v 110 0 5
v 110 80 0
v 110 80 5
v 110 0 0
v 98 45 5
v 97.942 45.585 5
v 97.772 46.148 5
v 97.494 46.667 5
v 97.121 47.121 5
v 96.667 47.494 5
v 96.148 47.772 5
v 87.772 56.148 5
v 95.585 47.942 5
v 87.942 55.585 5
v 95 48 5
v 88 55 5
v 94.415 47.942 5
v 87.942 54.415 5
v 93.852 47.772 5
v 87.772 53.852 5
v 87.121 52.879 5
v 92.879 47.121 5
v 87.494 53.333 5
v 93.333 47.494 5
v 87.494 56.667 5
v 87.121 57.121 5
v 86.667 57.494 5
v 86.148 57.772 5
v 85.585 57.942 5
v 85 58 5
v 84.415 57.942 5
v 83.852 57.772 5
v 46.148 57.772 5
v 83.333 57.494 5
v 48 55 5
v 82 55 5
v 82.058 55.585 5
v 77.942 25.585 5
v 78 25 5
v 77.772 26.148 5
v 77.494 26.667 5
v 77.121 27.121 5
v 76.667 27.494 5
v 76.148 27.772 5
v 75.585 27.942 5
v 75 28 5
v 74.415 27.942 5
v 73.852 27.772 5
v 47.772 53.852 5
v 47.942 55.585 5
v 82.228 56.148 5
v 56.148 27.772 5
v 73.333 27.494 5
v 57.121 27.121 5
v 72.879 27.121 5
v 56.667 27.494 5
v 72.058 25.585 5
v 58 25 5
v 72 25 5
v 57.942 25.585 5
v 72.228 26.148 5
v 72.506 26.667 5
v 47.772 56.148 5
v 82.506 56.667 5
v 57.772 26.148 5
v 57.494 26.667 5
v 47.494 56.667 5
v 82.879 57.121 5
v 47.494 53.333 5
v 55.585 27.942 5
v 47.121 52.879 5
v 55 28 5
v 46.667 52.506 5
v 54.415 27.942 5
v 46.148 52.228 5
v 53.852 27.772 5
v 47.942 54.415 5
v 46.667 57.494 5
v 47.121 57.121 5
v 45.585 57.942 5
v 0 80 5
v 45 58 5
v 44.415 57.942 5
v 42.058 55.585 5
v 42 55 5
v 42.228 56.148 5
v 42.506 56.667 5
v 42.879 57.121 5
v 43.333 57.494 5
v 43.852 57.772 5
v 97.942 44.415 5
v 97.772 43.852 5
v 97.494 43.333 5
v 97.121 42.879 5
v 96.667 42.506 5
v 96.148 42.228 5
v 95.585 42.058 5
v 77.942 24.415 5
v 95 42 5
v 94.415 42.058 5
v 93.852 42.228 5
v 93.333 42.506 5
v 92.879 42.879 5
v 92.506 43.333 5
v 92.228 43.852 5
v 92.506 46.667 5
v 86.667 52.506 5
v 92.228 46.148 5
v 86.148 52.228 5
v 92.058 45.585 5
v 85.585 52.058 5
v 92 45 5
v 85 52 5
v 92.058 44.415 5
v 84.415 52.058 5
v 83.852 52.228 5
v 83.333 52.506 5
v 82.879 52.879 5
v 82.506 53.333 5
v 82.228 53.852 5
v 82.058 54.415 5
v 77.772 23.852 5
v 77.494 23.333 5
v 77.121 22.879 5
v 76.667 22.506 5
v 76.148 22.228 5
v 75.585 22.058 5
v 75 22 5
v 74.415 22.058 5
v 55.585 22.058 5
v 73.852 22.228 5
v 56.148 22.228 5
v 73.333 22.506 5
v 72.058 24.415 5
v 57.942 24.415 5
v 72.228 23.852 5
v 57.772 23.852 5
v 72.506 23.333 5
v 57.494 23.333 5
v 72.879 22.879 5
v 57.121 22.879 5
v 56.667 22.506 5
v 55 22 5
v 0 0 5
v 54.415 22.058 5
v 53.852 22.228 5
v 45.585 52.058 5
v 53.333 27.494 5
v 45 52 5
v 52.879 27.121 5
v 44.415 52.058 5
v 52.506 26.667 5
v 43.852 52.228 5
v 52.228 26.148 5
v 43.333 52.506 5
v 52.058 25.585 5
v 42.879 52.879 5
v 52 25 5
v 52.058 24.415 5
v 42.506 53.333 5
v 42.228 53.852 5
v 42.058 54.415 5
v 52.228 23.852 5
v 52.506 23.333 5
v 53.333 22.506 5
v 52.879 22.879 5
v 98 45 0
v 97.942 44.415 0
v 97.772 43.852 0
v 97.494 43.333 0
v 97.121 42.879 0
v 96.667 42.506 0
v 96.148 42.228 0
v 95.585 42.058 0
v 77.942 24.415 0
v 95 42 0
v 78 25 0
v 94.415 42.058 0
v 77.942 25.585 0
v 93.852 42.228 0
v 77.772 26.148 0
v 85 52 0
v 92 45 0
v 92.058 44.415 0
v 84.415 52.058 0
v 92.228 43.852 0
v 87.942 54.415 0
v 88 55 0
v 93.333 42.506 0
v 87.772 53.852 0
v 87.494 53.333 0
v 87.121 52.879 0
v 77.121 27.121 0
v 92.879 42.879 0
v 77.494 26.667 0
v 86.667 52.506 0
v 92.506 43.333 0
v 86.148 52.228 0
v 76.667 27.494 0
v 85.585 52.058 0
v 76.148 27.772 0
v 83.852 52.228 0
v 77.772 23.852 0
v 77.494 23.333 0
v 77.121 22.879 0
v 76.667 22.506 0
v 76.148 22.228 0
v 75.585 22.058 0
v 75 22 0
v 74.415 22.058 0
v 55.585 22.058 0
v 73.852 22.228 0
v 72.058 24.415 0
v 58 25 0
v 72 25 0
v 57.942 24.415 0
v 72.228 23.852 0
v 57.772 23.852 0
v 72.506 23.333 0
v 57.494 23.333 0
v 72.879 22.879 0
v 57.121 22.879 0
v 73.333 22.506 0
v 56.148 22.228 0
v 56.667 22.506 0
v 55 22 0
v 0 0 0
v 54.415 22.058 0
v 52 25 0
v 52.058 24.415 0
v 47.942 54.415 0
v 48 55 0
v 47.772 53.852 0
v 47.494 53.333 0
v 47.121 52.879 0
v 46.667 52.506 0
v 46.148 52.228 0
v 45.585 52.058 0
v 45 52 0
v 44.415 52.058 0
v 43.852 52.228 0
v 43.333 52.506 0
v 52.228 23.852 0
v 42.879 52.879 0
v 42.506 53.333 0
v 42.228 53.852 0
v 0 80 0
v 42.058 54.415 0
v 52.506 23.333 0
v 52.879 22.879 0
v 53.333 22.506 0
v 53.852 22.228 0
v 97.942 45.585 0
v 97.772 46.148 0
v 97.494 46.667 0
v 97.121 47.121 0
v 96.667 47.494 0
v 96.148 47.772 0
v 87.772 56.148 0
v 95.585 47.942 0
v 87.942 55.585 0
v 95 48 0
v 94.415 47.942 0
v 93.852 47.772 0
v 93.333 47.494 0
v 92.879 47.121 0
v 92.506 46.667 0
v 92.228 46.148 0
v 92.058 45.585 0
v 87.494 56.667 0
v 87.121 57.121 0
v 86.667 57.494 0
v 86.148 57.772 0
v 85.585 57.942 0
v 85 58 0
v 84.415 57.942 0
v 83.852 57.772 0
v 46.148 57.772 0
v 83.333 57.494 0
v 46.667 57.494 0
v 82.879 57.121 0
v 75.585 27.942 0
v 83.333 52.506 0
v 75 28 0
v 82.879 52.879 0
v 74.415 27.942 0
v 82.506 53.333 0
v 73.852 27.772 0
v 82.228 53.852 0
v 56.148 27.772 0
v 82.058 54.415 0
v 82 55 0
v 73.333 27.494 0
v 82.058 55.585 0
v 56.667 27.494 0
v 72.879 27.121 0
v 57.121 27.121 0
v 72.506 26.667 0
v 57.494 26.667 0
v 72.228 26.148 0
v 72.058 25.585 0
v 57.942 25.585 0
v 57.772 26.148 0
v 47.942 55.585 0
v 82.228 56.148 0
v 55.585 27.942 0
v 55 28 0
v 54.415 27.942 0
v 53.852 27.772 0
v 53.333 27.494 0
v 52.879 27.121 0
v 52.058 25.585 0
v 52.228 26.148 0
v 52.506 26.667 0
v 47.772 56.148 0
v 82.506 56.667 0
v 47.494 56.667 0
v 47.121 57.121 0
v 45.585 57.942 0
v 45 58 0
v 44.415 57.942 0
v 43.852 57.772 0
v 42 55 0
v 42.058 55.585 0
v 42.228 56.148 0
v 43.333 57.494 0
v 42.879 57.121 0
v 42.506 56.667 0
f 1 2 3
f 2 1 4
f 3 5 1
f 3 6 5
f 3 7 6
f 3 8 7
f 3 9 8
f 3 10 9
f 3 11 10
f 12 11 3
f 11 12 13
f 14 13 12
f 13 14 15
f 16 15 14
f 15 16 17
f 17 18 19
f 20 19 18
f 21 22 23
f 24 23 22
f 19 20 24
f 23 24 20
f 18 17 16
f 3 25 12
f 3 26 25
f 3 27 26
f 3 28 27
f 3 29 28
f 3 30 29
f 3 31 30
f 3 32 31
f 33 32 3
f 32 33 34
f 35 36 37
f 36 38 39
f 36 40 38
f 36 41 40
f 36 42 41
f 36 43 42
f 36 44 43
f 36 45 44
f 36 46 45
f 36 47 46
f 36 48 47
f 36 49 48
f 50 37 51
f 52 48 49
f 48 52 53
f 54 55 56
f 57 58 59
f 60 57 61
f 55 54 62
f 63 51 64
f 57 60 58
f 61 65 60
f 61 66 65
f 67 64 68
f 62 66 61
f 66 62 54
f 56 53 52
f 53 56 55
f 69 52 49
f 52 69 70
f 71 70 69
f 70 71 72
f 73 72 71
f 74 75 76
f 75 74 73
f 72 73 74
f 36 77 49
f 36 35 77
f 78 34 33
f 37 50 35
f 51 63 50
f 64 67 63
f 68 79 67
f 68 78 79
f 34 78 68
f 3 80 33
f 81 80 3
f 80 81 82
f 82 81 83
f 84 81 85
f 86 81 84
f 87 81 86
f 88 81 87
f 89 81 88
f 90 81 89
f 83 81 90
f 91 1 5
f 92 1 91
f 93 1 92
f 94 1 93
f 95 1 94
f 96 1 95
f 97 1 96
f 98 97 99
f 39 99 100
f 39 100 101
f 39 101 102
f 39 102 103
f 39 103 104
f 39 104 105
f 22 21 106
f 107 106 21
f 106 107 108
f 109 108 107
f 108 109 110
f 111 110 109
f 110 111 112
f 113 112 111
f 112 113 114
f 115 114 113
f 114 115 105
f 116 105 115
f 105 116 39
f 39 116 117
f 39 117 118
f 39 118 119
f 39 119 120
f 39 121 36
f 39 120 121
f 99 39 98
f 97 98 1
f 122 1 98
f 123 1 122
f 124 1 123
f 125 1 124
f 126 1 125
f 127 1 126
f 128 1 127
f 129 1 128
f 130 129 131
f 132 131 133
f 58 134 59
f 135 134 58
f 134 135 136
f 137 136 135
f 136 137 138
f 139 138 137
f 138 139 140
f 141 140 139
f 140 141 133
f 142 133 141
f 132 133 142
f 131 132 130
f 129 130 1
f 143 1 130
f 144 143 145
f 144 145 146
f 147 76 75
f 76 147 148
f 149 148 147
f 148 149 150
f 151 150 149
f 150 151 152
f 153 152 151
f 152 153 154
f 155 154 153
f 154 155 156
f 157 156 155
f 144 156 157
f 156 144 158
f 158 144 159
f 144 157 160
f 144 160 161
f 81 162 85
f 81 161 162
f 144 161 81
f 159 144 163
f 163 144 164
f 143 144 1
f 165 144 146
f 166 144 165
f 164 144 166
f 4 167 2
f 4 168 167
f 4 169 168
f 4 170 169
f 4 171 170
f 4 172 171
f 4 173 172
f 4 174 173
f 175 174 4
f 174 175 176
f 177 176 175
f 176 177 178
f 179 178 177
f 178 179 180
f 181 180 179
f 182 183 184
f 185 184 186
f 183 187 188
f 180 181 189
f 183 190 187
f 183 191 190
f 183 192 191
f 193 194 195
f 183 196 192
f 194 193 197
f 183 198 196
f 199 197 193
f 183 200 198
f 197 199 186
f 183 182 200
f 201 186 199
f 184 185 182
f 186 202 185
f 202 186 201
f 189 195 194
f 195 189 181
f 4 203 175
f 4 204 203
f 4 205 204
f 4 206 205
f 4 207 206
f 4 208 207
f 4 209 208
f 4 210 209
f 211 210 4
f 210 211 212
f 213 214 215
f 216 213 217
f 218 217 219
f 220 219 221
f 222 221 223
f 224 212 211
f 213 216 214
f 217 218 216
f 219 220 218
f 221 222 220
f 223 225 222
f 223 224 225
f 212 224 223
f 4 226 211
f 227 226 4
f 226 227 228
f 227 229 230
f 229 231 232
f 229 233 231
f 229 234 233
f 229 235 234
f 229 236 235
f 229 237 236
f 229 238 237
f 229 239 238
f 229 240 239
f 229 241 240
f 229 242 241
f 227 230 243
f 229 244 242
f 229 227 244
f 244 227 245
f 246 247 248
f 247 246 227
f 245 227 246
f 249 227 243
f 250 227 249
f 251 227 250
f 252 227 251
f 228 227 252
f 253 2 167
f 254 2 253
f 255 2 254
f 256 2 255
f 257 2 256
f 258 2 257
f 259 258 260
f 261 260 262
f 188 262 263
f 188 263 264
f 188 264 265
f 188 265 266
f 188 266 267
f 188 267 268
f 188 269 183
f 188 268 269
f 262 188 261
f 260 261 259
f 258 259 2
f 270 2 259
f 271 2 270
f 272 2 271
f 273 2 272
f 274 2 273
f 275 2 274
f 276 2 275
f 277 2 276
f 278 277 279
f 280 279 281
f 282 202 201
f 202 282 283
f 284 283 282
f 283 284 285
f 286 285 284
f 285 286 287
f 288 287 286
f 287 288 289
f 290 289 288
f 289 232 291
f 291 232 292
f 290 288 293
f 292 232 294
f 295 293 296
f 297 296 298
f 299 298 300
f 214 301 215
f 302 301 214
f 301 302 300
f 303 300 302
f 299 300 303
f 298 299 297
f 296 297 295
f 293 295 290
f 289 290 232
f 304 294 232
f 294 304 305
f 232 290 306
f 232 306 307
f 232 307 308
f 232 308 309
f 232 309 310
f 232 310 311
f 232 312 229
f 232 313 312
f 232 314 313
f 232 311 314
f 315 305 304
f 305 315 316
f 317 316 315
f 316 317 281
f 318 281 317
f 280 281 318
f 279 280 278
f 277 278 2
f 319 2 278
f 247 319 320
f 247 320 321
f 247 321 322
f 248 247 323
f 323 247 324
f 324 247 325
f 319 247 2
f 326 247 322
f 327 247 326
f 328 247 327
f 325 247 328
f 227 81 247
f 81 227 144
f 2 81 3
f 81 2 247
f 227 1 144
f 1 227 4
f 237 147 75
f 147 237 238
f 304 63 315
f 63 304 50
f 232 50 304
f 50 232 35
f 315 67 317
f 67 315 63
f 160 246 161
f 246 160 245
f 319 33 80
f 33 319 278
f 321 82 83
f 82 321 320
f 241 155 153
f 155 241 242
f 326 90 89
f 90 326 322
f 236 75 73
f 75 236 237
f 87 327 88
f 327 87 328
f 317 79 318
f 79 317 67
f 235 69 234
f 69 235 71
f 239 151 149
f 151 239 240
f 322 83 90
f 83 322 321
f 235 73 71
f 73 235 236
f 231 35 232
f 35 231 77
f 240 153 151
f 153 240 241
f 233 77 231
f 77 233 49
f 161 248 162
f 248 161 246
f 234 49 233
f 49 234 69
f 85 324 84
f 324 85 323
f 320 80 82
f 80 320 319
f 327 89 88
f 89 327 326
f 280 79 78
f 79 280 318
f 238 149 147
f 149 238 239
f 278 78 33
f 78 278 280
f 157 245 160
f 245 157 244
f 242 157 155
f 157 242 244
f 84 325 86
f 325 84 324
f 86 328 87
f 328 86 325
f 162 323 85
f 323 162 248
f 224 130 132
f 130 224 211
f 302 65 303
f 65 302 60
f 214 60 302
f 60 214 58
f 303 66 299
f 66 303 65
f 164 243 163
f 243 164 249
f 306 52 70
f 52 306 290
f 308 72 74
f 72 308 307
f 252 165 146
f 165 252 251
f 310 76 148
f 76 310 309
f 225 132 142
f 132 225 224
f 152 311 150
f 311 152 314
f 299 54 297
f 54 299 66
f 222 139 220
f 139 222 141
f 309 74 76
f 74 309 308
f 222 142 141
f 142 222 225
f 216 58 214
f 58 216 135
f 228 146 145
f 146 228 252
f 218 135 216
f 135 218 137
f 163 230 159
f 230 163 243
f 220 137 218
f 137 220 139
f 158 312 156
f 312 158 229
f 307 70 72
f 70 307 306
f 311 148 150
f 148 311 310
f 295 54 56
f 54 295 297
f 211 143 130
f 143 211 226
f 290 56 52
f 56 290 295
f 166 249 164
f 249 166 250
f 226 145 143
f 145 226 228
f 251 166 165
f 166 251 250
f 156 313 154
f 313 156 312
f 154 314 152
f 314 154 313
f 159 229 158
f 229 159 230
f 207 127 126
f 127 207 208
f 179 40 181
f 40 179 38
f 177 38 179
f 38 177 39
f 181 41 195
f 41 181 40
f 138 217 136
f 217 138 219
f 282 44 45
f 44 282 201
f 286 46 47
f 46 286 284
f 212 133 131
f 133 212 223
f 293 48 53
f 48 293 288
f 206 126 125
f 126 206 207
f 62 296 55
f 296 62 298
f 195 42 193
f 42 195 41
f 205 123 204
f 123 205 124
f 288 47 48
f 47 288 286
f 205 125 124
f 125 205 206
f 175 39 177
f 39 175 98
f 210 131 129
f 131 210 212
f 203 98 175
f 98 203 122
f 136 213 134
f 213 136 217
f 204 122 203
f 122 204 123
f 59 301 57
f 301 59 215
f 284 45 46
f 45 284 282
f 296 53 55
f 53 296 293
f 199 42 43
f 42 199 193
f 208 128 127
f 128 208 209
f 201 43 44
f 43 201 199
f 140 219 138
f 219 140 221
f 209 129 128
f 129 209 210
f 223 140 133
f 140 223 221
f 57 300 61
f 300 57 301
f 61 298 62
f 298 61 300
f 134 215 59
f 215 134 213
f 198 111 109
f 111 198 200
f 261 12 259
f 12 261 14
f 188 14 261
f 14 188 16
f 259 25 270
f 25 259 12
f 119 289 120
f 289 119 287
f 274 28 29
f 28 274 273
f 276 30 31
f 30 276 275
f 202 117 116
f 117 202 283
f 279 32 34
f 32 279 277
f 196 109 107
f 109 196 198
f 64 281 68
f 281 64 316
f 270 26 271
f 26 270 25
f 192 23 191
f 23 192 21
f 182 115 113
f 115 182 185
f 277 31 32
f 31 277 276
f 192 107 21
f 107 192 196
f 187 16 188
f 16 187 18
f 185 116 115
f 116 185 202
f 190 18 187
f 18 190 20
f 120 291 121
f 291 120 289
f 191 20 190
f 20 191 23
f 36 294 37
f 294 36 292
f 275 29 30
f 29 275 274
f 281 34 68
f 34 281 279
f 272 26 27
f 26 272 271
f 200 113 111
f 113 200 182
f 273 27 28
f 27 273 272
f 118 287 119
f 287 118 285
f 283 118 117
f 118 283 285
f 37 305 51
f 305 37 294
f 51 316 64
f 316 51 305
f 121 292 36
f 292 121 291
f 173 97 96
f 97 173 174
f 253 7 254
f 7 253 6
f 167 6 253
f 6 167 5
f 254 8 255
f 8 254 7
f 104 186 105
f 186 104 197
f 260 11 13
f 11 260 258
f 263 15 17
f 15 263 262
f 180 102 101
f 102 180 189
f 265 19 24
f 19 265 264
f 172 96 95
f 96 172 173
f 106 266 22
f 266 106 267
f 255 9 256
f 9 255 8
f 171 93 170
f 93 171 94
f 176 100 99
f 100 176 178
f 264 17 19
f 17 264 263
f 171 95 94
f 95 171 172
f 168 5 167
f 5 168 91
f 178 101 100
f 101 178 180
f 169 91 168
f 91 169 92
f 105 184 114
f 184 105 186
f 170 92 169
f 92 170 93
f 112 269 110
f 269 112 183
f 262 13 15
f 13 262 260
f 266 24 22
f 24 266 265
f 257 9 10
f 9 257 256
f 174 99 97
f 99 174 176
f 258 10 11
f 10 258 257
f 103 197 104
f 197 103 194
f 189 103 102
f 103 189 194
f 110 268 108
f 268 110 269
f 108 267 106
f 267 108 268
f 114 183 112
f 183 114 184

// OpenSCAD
$fn = 32;

// ----------------------------------------------------------------------
// Hole field: plate with holes at given coordinates
// ----------------------------------------------------------------------

// --- parameters (mm) ---
plate_l = 110;            // plate length, X
plate_w = 80;             // plate width, Y
plate_t = 5;              // plate thickness, Z
hole_d = 6;               // hole diameter
fit_tol = 0.02;           // tolerance for press fits, mm
free_tol = 0.2;           // tolerance for clearance fits, mm

difference() {
  cube([plate_l, plate_w, plate_t]);
  translate([45, 55, -1]) cylinder(h = plate_t + 2, d = hole_d);
  translate([55, 25, -1]) cylinder(h = plate_t + 2, d = hole_d);
  translate([75, 25, -1]) cylinder(h = plate_t + 2, d = hole_d);
  translate([85, 55, -1]) cylinder(h = plate_t + 2, d = hole_d);
  translate([95, 45, -1]) cylinder(h = plate_t + 2, d = hole_d);
}
